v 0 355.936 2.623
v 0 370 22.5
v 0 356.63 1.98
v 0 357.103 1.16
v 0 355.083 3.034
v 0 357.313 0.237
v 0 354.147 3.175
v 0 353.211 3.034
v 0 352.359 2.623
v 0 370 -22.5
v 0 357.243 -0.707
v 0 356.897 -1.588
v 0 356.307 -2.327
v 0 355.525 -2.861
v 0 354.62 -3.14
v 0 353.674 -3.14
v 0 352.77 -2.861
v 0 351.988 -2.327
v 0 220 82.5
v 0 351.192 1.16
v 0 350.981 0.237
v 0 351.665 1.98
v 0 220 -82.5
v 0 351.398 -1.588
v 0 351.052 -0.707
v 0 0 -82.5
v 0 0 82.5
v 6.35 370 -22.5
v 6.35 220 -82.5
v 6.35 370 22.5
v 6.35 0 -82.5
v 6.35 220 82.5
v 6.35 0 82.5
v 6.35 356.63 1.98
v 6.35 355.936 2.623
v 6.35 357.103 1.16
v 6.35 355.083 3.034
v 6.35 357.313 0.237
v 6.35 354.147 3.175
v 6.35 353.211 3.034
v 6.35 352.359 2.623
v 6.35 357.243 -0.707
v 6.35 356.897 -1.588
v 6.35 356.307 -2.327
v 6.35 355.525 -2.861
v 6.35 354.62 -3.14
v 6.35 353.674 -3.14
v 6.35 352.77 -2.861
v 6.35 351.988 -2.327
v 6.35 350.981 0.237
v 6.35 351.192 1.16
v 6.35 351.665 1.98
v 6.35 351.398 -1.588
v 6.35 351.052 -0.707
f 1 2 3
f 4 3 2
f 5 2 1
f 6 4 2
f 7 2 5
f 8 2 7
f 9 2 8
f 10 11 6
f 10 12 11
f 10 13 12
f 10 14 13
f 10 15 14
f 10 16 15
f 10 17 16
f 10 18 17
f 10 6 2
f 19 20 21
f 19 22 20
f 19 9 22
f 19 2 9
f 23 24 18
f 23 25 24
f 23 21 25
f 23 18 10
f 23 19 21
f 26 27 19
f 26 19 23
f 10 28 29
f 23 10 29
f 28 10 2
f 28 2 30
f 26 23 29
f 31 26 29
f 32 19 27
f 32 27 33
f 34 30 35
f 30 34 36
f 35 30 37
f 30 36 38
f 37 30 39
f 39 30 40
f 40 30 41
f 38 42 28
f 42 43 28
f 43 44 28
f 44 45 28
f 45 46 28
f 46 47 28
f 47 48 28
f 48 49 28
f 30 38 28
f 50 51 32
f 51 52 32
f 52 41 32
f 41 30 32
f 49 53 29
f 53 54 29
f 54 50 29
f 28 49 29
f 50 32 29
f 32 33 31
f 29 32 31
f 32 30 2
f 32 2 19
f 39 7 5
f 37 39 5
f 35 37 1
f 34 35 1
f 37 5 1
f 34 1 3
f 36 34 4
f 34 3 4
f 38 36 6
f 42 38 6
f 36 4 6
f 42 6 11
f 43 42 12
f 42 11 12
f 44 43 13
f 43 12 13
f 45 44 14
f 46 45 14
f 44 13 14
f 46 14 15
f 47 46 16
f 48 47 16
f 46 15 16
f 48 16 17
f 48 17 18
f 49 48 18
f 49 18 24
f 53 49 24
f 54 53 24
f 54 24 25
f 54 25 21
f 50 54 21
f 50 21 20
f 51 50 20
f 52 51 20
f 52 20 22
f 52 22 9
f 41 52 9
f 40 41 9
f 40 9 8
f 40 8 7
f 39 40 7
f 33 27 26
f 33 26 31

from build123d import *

# Parameters (mm, degrees)
SKETCH1_W                   = 6.35
SKETCH1_H                   = 165
BOSS_EXTRUDE1_DEPTH         = 370
F_1_4_0_25_DIAMETER_HOLE1_D = 6.35
CUT_EXTRUDE1_DEPTH          = 380.139252122


with BuildPart() as part:
    # Sketch1 → Boss-Extrude1 (new body)
    with BuildSketch(Plane(origin=(0, 0, 0), x_dir=(1, 0, 0), z_dir=(0, 1, 0))):
        with Locations((3.175, 0)):
            Rectangle(SKETCH1_W, SKETCH1_H)
    extrude(amount=BOSS_EXTRUDE1_DEPTH)

    # 1/4 (0.25) Diameter Hole1 (through all)
    with Locations(Plane(origin=(6.35, 0, 0), x_dir=(0, 0, -1), z_dir=(1, 0, 0))):
        with Locations((0, 354.147260033)):
            Hole(F_1_4_0_25_DIAMETER_HOLE1_D / 2)

    # Sketch4 → Cut-Extrude1 (cut, through all)
    with BuildSketch(Plane(origin=(6.35, 0, 0), x_dir=(0, 0, -1), z_dir=(1, 0, 0))):
        Polygon((-22.5, 370), (-82.5, 220), (-82.5, 370), align=None)
        Polygon((82.5, 370), (22.5, 370), (82.5, 220), align=None)
    extrude(amount=-CUT_EXTRUDE1_DEPTH, mode=Mode.SUBTRACT)


solid = part.part
